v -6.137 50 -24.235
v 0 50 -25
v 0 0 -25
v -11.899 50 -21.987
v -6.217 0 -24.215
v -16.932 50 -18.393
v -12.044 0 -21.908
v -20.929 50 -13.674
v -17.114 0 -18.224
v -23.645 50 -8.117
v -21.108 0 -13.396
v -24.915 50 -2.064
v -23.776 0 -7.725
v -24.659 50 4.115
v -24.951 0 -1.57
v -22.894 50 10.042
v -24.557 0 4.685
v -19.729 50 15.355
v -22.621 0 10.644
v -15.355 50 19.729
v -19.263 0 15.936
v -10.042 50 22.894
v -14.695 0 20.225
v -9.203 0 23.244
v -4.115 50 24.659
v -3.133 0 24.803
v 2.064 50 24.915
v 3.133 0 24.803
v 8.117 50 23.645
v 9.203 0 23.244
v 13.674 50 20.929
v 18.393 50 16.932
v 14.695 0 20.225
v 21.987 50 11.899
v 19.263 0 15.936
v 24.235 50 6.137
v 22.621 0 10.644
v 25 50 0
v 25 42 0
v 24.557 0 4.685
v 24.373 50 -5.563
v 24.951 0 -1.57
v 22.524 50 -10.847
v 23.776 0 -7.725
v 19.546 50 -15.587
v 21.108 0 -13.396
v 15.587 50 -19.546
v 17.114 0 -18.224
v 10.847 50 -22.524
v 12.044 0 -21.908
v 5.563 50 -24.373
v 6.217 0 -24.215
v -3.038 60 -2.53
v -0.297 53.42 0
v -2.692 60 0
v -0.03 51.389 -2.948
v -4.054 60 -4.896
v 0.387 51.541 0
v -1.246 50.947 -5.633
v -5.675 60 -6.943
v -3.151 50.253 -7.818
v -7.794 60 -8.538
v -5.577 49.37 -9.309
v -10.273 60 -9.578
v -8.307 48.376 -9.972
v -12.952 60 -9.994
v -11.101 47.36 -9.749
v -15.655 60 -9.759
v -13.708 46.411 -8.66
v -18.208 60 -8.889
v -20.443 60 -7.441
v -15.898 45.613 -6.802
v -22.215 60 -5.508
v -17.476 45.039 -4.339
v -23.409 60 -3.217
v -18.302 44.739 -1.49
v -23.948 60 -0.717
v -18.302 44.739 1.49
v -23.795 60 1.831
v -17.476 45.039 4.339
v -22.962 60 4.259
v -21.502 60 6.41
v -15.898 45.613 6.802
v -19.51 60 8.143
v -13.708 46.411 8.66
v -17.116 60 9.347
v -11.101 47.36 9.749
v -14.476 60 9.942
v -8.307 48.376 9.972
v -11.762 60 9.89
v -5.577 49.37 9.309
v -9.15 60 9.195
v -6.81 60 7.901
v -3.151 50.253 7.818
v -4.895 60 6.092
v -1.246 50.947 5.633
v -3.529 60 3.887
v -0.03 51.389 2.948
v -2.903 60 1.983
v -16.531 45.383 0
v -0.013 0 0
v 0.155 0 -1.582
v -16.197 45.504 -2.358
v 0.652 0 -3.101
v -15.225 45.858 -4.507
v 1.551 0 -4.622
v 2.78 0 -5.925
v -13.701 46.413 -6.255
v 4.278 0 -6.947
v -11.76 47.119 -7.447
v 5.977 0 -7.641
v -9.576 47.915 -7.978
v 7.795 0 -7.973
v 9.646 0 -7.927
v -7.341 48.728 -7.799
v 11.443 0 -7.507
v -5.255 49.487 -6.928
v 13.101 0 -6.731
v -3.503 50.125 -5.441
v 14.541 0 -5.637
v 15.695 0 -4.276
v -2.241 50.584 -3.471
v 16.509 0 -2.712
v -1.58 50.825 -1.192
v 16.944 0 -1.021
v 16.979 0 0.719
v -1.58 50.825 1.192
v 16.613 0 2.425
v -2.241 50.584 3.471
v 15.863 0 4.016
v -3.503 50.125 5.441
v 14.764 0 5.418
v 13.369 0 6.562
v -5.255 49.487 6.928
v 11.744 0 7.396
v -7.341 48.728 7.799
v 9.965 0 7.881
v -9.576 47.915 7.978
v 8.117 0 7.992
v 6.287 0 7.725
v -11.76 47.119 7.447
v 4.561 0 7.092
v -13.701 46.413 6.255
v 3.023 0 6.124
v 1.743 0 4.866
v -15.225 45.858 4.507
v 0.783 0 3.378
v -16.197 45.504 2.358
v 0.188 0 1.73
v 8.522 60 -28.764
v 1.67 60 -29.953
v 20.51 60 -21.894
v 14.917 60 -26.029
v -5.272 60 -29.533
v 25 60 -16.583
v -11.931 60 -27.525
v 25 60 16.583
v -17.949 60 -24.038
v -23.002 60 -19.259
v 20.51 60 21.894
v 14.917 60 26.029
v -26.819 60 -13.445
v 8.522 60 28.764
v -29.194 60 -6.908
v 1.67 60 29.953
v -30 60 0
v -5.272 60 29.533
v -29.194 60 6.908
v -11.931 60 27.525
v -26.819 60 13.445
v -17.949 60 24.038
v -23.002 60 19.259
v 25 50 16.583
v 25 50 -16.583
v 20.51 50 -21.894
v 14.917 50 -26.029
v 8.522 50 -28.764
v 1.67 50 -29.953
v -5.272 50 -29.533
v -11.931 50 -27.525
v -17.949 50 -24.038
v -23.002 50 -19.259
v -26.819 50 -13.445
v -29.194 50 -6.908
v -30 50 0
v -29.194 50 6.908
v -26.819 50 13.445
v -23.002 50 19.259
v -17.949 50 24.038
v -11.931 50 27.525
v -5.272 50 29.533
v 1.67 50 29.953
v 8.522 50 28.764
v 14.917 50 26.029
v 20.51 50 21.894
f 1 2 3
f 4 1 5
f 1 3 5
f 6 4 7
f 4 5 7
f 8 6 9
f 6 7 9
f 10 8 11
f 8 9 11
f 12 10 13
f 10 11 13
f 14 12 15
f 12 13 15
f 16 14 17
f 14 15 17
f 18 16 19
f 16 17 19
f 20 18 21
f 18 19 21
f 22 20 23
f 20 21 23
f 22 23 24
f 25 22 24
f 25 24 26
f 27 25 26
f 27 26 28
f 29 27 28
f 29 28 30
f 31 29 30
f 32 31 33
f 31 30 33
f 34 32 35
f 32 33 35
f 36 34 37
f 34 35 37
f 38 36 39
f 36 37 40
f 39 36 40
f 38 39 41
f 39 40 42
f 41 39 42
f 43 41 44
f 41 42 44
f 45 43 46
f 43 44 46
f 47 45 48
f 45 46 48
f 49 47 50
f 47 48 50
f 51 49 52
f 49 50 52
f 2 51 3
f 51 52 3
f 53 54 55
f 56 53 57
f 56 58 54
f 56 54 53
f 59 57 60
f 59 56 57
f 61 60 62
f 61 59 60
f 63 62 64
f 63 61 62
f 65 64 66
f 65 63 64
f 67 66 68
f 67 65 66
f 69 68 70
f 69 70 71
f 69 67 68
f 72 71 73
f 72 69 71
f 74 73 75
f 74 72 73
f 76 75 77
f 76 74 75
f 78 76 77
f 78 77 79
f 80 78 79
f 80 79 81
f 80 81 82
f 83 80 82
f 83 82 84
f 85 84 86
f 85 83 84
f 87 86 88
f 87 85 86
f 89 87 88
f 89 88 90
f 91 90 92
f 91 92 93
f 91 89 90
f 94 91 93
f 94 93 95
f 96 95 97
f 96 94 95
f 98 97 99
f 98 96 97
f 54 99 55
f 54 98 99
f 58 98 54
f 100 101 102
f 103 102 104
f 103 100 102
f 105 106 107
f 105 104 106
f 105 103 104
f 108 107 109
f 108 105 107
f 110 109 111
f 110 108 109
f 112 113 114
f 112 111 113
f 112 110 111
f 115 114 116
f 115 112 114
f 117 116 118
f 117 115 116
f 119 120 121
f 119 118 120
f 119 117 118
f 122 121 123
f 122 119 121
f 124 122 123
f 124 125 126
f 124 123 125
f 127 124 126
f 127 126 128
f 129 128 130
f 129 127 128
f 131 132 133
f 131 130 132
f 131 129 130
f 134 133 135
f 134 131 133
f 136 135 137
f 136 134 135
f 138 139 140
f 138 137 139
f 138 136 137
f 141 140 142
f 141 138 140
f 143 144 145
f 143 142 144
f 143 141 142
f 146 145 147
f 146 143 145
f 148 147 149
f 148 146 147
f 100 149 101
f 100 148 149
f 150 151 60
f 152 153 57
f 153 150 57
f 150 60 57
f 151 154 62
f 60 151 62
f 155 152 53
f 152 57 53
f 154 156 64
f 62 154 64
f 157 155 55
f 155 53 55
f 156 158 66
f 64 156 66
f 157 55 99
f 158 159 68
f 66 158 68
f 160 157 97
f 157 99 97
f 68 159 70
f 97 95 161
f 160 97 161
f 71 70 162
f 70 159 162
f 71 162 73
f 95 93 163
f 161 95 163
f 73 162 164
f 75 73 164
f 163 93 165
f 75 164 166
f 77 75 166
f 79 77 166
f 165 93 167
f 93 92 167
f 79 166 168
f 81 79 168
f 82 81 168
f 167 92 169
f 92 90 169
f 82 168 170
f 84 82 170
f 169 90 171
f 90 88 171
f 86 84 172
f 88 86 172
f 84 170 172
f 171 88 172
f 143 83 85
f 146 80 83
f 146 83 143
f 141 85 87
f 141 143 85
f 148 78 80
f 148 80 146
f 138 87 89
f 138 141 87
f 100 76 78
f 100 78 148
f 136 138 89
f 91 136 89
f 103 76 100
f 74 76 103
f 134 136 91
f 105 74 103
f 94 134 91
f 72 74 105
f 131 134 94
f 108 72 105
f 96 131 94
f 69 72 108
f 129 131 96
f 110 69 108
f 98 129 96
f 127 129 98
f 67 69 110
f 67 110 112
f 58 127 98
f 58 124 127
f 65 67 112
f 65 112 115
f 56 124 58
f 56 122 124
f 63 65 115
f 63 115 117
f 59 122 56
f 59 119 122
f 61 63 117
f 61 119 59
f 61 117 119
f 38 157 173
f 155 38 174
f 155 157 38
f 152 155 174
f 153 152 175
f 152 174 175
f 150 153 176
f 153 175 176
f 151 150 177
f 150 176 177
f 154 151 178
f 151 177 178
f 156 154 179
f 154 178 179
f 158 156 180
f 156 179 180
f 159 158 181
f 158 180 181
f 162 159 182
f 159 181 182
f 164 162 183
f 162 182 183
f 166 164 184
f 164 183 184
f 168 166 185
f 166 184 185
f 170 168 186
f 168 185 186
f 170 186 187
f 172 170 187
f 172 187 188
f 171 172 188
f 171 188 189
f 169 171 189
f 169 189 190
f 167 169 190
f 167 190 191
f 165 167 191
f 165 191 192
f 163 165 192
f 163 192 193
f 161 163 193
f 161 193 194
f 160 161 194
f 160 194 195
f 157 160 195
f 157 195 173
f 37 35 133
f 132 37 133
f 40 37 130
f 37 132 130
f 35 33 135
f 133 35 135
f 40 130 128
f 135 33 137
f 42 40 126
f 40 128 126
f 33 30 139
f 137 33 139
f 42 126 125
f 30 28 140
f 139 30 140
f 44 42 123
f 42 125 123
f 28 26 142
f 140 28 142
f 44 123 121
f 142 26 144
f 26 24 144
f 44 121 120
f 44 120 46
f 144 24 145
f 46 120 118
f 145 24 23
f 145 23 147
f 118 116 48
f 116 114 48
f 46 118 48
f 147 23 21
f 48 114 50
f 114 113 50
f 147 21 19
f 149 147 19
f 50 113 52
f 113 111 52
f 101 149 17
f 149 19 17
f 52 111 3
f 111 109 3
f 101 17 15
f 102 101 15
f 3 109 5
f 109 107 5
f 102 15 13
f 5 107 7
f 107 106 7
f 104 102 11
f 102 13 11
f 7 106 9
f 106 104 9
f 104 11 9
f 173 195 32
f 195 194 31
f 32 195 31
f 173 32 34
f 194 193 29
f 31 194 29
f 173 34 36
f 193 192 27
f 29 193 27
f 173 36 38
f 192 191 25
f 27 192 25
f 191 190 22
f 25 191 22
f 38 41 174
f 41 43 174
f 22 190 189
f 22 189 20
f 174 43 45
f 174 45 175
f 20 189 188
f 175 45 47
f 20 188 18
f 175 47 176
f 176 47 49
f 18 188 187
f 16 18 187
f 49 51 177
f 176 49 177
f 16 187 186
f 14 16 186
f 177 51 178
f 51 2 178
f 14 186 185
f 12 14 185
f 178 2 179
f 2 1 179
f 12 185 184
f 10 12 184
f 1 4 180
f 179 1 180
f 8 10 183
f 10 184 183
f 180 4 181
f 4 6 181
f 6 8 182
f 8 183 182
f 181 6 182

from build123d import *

# Parameters (mm, degrees)
SKETCH4_W          = 19.505959246
SKETCH4_H          = 52.283096245
CUT_EXTRUDE1_DEPTH = 18


with BuildPart() as part:
    # Sketch1 → Revolve1 (revolve)
    with BuildSketch(Plane.XY, mode=Mode.PRIVATE) as revolve1_sk:
        Polygon((0, 0), (0, 60), (30, 60), (30, 50), (25, 50), (25, 0), align=None)
    revolve(revolve1_sk.sketch.rotate(Axis((0, 0, 0), (0, 1, 0)), 90), axis=Axis((0, 0, 0), (0, 1, 0)))

    # Sketch4 → Cut-Extrude1 (cut)
    with BuildSketch(Plane(origin=(0, 60, 0), x_dir=(1, 0, 0), z_dir=(0, 1, 0))):
        with Locations((34.752979623, -0.356273229)):
            Rectangle(SKETCH4_W, SKETCH4_H)
    extrude(amount=-CUT_EXTRUDE1_DEPTH, mode=Mode.SUBTRACT)

    # Sketch5 → Cut-Revolve1 (revolve, cut)
    with BuildSketch(Plane.XY, mode=Mode.PRIVATE) as cut_revolve1_sk:
        Polygon((-23.756678995, 88.624497165), (16.900700587, -23.08073517), (24.418241553, -20.344574023), (-16.239138029, 91.360658312), align=None)
    revolve(cut_revolve1_sk.sketch.rotate(Axis((-23.756678995, 88.624497165, 0), (0.34202014332567277, -0.939692620785907, 0)), 180), axis=Axis((-23.756678995, 88.624497165, 0), (0.34202014332567277, -0.939692620785907, 0)), mode=Mode.SUBTRACT)

    # Sketch6 → Cut-Revolve2 (revolve, cut)
    with BuildSketch(Plane.XY):
        Polygon((-9.693720942, 50), (-17.792178214, 72.250328486), (-8.395252006, 75.670529919), (-0.296794735, 53.420201433), (0.387245552, 51.540816192), (-9.009680656, 48.120614758), align=None)
    revolve(axis=Axis((-9.693720942, 50, 0), (-0.3420201433256727, 0.939692620785907, 0)), mode=Mode.SUBTRACT)


solid = part.part
